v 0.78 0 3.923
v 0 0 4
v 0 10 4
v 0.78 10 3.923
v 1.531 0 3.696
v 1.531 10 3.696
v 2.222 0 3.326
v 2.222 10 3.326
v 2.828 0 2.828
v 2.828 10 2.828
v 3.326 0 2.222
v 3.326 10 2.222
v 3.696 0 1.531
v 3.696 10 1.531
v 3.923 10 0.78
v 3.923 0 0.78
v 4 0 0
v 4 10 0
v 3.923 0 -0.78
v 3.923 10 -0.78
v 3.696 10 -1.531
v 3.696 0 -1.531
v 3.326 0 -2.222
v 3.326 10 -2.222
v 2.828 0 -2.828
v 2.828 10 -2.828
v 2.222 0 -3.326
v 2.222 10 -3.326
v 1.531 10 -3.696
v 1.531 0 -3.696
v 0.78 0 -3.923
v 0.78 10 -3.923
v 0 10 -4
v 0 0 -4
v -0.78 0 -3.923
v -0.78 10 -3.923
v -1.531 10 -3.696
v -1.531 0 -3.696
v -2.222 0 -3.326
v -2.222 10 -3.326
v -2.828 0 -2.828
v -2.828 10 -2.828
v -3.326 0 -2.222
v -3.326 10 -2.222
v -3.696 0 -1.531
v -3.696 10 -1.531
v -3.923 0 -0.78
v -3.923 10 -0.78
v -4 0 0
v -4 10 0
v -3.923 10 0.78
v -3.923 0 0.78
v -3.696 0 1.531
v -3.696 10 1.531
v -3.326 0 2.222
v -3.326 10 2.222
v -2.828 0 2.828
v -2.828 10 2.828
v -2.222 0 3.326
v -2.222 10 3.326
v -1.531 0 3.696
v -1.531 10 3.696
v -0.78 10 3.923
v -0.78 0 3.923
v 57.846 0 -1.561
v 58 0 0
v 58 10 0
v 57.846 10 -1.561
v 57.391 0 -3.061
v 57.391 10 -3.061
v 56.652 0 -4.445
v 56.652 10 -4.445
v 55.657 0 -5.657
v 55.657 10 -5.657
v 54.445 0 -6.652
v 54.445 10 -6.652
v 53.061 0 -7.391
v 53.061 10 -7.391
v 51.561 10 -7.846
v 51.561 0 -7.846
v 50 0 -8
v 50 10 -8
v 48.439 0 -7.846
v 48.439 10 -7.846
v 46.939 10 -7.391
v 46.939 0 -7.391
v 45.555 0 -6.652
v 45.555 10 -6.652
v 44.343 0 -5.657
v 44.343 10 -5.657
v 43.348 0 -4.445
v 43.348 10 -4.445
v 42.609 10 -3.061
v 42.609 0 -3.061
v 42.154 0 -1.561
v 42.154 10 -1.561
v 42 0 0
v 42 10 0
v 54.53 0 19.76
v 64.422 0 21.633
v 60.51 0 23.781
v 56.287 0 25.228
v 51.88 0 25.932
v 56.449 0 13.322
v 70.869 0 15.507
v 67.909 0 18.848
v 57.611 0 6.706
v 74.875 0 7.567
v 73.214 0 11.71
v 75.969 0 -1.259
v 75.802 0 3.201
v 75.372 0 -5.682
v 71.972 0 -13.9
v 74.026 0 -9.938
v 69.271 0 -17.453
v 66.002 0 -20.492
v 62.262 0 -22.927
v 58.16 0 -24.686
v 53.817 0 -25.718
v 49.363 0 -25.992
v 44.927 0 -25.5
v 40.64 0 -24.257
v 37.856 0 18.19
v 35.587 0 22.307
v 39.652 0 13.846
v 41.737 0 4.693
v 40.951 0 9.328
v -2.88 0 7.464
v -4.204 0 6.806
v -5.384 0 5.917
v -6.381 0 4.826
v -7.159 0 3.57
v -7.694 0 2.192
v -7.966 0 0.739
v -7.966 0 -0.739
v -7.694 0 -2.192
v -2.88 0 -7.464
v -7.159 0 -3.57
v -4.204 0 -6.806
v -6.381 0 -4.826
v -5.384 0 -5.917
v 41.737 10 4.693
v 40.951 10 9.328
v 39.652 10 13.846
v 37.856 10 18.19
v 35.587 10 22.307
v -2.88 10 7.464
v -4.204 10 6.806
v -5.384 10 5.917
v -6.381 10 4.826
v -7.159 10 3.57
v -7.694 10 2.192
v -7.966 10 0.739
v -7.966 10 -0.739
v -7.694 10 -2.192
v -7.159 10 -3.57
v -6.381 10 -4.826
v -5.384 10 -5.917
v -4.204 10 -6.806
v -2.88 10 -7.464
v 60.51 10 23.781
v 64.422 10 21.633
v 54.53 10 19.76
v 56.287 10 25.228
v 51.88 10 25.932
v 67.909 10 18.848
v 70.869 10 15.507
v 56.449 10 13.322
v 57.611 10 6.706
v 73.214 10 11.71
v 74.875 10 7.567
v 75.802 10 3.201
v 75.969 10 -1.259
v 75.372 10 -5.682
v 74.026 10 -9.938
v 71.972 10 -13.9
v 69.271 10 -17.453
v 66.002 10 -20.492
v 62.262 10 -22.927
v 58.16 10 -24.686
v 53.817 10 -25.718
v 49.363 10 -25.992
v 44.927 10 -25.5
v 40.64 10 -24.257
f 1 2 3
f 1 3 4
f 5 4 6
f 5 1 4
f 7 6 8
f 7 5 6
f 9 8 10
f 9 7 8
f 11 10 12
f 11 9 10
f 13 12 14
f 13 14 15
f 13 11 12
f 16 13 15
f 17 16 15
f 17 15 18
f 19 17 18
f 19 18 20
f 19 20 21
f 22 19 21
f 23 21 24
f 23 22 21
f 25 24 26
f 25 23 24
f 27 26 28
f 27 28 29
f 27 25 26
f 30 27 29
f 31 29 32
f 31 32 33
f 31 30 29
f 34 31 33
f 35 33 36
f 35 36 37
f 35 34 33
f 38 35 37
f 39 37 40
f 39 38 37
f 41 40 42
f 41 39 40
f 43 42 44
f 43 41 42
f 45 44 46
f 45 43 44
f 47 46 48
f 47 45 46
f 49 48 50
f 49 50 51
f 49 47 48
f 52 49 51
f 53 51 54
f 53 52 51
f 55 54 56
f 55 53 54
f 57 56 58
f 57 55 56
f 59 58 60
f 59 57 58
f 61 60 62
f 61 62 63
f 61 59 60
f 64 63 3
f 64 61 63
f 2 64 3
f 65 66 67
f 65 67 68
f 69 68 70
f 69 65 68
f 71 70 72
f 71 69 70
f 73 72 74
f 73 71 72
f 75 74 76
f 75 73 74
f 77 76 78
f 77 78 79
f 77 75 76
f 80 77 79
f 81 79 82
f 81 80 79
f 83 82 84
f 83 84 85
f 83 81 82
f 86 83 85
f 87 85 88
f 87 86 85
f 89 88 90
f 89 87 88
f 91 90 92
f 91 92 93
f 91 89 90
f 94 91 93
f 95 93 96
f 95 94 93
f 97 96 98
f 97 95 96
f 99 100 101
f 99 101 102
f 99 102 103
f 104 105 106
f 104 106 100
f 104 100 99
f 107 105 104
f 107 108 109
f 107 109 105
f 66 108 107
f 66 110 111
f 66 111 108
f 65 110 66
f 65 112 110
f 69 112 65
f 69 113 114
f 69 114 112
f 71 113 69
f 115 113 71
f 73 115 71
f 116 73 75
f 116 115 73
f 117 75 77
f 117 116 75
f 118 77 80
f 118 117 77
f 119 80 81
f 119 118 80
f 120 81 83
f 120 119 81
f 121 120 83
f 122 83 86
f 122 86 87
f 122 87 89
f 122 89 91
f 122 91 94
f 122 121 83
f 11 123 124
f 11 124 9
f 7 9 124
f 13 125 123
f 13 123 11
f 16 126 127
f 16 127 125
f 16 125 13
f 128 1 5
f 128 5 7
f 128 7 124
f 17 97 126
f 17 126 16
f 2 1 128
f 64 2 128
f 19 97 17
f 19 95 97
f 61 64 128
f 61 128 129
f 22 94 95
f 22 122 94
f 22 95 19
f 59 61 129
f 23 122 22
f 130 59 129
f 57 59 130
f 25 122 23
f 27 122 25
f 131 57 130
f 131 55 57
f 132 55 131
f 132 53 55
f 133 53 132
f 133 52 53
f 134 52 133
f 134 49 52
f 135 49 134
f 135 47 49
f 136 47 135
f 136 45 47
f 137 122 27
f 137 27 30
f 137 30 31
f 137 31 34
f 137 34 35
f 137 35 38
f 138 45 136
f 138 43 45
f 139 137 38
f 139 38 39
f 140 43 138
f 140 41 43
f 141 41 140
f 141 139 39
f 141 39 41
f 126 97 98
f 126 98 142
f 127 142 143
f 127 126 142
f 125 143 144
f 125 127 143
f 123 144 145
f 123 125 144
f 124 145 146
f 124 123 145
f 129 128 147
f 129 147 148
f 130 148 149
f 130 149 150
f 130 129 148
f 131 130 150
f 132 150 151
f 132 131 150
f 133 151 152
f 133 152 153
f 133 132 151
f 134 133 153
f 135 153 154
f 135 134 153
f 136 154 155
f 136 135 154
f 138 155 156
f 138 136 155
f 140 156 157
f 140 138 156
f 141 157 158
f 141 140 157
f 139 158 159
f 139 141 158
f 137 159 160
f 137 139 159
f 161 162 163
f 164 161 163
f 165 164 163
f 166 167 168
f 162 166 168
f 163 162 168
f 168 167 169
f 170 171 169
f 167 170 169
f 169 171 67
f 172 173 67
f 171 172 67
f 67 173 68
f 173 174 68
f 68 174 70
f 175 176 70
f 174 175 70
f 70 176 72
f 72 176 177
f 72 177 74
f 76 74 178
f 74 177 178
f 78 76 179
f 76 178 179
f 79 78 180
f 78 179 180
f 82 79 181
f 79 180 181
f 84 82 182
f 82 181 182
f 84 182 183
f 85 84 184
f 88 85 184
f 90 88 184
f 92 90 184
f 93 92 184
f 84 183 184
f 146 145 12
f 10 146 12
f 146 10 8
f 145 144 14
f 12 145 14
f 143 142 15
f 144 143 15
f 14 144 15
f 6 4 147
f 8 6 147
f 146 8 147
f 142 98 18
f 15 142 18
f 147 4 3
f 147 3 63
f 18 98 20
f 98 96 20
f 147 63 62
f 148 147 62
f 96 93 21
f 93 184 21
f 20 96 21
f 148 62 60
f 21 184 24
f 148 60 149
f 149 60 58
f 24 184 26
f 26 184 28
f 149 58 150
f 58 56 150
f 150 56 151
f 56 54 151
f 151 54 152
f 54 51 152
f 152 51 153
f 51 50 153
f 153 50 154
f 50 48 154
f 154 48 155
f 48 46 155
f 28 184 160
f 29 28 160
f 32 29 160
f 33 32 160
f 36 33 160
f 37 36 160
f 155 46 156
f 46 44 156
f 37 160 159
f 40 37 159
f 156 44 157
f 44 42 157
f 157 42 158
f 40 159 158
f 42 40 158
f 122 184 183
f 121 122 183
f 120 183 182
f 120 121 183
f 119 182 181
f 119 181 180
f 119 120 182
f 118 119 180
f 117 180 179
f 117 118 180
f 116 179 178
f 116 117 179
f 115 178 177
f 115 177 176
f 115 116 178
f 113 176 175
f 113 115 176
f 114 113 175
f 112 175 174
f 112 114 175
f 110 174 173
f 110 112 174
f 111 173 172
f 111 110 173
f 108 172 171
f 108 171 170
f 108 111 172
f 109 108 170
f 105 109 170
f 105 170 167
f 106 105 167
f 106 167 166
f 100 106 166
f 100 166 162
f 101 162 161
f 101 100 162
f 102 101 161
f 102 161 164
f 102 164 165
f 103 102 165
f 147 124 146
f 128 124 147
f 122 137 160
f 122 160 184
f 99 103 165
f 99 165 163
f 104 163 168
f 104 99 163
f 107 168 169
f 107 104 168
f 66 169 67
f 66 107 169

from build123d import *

# Parameters (mm, degrees)
SKETCH1_R           = 4
BOSS_EXTRUDE1_DEPTH = 10


with BuildPart() as part:
    # Sketch1 → Boss-Extrude1 (new body)
    with BuildSketch(Plane(origin=(0, 0, 0), x_dir=(1, 0, 0), z_dir=(0, 1, 0))):
        with BuildLine():
            Line((-2.88, 7.463618425), (40.64, 24.256759883))
            ThreePointArc((40.64, 24.256759883), (75.371520283, 5.682073435), (51.88, -25.931941694))
            ThreePointArc((51.88, -25.931941694), (56.44926926, -13.322161987), (58, 0))
            ThreePointArc((58, 0), (50, 8), (42, 0))
            ThreePointArc((42, 0), (40.364821154, -11.60522353), (35.586608897, -22.306798678))
            Line((35.586608897, -22.306798678), (-2.88, -7.463618425))
            ThreePointArc((-2.88, -7.463618425), (-8, 0), (-2.88, 7.463618425))
        make_face()
        with Locations(Location((0, 0, 0), (0, 0, 270))):
            Circle(SKETCH1_R, mode=Mode.SUBTRACT)
    extrude(amount=BOSS_EXTRUDE1_DEPTH)


solid = part.part
